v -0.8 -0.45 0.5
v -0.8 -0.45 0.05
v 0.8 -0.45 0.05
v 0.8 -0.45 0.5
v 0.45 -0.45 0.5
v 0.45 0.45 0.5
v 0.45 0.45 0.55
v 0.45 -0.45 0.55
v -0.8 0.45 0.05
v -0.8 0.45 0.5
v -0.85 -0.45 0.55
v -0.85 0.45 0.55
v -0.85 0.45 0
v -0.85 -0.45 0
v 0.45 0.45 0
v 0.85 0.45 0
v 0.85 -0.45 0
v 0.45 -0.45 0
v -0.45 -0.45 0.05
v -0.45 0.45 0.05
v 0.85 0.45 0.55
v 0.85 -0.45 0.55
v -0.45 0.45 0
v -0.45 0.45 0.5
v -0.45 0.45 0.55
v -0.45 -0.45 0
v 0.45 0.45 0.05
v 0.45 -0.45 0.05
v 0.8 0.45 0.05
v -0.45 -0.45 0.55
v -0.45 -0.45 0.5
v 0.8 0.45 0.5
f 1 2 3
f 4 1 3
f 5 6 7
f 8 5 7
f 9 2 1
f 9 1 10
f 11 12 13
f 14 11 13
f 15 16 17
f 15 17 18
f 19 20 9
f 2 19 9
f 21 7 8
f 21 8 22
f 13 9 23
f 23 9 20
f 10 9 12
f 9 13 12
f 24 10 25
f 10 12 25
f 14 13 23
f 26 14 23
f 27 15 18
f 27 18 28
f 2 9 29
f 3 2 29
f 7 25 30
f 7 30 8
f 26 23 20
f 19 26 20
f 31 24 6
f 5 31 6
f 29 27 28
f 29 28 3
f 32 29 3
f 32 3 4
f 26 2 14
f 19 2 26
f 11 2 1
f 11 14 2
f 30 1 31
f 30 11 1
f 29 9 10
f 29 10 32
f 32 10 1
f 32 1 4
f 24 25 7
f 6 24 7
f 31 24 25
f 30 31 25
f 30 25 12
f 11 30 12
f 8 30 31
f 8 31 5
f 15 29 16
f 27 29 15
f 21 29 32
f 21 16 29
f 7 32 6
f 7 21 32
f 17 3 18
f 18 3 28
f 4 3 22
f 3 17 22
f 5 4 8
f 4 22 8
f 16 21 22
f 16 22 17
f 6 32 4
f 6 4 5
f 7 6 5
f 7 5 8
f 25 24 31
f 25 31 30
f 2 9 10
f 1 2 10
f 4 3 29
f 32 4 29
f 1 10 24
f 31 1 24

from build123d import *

# Parameters (mm, degrees)
SKETCH_W         = 1.6
SKETCH_H         = 0.9
EXTRUDE_DEPTH    = 0.45
EXTRUDE001_DEPTH = 0.9
SKETCH002_W      = 0.9
SKETCH002_H      = 0.05
EXTRUDE002_DEPTH = 0.9


with BuildPart() as body_main:
    # Sketch → Extrude (new body)
    with BuildSketch(Plane.XY.offset(0.05)):
        Rectangle(SKETCH_W, SKETCH_H)
    extrude(amount=EXTRUDE_DEPTH)


with BuildPart() as pin:
    # Sketch001 → Extrude001 (new body)
    with BuildSketch(Plane.XZ.offset(-0.45)):
        Polygon((-0.45, 0.55), (-0.85, 0.55), (-0.85, 0), (-0.45, 0), (-0.45, 0.05), (-0.8, 0.05), (-0.8, 0.5), (-0.45, 0.5), align=None)
        Polygon((0.45, 0.55), (0.85, 0.55), (0.85, 0), (0.45, 0), (0.45, 0.05), (0.8, 0.05), (0.8, 0.5), (0.45, 0.5), align=None)
    extrude(amount=EXTRUDE001_DEPTH)


with BuildPart() as body_top:
    # Sketch002 → Extrude002 (new body)
    with BuildSketch(Plane.XZ.offset(-0.45)):
        with Locations((0, 0.525)):
            Rectangle(SKETCH002_W, SKETCH002_H)
    extrude(amount=EXTRUDE002_DEPTH)


solid = Compound([body_main.part, pin.part, body_top.part])
